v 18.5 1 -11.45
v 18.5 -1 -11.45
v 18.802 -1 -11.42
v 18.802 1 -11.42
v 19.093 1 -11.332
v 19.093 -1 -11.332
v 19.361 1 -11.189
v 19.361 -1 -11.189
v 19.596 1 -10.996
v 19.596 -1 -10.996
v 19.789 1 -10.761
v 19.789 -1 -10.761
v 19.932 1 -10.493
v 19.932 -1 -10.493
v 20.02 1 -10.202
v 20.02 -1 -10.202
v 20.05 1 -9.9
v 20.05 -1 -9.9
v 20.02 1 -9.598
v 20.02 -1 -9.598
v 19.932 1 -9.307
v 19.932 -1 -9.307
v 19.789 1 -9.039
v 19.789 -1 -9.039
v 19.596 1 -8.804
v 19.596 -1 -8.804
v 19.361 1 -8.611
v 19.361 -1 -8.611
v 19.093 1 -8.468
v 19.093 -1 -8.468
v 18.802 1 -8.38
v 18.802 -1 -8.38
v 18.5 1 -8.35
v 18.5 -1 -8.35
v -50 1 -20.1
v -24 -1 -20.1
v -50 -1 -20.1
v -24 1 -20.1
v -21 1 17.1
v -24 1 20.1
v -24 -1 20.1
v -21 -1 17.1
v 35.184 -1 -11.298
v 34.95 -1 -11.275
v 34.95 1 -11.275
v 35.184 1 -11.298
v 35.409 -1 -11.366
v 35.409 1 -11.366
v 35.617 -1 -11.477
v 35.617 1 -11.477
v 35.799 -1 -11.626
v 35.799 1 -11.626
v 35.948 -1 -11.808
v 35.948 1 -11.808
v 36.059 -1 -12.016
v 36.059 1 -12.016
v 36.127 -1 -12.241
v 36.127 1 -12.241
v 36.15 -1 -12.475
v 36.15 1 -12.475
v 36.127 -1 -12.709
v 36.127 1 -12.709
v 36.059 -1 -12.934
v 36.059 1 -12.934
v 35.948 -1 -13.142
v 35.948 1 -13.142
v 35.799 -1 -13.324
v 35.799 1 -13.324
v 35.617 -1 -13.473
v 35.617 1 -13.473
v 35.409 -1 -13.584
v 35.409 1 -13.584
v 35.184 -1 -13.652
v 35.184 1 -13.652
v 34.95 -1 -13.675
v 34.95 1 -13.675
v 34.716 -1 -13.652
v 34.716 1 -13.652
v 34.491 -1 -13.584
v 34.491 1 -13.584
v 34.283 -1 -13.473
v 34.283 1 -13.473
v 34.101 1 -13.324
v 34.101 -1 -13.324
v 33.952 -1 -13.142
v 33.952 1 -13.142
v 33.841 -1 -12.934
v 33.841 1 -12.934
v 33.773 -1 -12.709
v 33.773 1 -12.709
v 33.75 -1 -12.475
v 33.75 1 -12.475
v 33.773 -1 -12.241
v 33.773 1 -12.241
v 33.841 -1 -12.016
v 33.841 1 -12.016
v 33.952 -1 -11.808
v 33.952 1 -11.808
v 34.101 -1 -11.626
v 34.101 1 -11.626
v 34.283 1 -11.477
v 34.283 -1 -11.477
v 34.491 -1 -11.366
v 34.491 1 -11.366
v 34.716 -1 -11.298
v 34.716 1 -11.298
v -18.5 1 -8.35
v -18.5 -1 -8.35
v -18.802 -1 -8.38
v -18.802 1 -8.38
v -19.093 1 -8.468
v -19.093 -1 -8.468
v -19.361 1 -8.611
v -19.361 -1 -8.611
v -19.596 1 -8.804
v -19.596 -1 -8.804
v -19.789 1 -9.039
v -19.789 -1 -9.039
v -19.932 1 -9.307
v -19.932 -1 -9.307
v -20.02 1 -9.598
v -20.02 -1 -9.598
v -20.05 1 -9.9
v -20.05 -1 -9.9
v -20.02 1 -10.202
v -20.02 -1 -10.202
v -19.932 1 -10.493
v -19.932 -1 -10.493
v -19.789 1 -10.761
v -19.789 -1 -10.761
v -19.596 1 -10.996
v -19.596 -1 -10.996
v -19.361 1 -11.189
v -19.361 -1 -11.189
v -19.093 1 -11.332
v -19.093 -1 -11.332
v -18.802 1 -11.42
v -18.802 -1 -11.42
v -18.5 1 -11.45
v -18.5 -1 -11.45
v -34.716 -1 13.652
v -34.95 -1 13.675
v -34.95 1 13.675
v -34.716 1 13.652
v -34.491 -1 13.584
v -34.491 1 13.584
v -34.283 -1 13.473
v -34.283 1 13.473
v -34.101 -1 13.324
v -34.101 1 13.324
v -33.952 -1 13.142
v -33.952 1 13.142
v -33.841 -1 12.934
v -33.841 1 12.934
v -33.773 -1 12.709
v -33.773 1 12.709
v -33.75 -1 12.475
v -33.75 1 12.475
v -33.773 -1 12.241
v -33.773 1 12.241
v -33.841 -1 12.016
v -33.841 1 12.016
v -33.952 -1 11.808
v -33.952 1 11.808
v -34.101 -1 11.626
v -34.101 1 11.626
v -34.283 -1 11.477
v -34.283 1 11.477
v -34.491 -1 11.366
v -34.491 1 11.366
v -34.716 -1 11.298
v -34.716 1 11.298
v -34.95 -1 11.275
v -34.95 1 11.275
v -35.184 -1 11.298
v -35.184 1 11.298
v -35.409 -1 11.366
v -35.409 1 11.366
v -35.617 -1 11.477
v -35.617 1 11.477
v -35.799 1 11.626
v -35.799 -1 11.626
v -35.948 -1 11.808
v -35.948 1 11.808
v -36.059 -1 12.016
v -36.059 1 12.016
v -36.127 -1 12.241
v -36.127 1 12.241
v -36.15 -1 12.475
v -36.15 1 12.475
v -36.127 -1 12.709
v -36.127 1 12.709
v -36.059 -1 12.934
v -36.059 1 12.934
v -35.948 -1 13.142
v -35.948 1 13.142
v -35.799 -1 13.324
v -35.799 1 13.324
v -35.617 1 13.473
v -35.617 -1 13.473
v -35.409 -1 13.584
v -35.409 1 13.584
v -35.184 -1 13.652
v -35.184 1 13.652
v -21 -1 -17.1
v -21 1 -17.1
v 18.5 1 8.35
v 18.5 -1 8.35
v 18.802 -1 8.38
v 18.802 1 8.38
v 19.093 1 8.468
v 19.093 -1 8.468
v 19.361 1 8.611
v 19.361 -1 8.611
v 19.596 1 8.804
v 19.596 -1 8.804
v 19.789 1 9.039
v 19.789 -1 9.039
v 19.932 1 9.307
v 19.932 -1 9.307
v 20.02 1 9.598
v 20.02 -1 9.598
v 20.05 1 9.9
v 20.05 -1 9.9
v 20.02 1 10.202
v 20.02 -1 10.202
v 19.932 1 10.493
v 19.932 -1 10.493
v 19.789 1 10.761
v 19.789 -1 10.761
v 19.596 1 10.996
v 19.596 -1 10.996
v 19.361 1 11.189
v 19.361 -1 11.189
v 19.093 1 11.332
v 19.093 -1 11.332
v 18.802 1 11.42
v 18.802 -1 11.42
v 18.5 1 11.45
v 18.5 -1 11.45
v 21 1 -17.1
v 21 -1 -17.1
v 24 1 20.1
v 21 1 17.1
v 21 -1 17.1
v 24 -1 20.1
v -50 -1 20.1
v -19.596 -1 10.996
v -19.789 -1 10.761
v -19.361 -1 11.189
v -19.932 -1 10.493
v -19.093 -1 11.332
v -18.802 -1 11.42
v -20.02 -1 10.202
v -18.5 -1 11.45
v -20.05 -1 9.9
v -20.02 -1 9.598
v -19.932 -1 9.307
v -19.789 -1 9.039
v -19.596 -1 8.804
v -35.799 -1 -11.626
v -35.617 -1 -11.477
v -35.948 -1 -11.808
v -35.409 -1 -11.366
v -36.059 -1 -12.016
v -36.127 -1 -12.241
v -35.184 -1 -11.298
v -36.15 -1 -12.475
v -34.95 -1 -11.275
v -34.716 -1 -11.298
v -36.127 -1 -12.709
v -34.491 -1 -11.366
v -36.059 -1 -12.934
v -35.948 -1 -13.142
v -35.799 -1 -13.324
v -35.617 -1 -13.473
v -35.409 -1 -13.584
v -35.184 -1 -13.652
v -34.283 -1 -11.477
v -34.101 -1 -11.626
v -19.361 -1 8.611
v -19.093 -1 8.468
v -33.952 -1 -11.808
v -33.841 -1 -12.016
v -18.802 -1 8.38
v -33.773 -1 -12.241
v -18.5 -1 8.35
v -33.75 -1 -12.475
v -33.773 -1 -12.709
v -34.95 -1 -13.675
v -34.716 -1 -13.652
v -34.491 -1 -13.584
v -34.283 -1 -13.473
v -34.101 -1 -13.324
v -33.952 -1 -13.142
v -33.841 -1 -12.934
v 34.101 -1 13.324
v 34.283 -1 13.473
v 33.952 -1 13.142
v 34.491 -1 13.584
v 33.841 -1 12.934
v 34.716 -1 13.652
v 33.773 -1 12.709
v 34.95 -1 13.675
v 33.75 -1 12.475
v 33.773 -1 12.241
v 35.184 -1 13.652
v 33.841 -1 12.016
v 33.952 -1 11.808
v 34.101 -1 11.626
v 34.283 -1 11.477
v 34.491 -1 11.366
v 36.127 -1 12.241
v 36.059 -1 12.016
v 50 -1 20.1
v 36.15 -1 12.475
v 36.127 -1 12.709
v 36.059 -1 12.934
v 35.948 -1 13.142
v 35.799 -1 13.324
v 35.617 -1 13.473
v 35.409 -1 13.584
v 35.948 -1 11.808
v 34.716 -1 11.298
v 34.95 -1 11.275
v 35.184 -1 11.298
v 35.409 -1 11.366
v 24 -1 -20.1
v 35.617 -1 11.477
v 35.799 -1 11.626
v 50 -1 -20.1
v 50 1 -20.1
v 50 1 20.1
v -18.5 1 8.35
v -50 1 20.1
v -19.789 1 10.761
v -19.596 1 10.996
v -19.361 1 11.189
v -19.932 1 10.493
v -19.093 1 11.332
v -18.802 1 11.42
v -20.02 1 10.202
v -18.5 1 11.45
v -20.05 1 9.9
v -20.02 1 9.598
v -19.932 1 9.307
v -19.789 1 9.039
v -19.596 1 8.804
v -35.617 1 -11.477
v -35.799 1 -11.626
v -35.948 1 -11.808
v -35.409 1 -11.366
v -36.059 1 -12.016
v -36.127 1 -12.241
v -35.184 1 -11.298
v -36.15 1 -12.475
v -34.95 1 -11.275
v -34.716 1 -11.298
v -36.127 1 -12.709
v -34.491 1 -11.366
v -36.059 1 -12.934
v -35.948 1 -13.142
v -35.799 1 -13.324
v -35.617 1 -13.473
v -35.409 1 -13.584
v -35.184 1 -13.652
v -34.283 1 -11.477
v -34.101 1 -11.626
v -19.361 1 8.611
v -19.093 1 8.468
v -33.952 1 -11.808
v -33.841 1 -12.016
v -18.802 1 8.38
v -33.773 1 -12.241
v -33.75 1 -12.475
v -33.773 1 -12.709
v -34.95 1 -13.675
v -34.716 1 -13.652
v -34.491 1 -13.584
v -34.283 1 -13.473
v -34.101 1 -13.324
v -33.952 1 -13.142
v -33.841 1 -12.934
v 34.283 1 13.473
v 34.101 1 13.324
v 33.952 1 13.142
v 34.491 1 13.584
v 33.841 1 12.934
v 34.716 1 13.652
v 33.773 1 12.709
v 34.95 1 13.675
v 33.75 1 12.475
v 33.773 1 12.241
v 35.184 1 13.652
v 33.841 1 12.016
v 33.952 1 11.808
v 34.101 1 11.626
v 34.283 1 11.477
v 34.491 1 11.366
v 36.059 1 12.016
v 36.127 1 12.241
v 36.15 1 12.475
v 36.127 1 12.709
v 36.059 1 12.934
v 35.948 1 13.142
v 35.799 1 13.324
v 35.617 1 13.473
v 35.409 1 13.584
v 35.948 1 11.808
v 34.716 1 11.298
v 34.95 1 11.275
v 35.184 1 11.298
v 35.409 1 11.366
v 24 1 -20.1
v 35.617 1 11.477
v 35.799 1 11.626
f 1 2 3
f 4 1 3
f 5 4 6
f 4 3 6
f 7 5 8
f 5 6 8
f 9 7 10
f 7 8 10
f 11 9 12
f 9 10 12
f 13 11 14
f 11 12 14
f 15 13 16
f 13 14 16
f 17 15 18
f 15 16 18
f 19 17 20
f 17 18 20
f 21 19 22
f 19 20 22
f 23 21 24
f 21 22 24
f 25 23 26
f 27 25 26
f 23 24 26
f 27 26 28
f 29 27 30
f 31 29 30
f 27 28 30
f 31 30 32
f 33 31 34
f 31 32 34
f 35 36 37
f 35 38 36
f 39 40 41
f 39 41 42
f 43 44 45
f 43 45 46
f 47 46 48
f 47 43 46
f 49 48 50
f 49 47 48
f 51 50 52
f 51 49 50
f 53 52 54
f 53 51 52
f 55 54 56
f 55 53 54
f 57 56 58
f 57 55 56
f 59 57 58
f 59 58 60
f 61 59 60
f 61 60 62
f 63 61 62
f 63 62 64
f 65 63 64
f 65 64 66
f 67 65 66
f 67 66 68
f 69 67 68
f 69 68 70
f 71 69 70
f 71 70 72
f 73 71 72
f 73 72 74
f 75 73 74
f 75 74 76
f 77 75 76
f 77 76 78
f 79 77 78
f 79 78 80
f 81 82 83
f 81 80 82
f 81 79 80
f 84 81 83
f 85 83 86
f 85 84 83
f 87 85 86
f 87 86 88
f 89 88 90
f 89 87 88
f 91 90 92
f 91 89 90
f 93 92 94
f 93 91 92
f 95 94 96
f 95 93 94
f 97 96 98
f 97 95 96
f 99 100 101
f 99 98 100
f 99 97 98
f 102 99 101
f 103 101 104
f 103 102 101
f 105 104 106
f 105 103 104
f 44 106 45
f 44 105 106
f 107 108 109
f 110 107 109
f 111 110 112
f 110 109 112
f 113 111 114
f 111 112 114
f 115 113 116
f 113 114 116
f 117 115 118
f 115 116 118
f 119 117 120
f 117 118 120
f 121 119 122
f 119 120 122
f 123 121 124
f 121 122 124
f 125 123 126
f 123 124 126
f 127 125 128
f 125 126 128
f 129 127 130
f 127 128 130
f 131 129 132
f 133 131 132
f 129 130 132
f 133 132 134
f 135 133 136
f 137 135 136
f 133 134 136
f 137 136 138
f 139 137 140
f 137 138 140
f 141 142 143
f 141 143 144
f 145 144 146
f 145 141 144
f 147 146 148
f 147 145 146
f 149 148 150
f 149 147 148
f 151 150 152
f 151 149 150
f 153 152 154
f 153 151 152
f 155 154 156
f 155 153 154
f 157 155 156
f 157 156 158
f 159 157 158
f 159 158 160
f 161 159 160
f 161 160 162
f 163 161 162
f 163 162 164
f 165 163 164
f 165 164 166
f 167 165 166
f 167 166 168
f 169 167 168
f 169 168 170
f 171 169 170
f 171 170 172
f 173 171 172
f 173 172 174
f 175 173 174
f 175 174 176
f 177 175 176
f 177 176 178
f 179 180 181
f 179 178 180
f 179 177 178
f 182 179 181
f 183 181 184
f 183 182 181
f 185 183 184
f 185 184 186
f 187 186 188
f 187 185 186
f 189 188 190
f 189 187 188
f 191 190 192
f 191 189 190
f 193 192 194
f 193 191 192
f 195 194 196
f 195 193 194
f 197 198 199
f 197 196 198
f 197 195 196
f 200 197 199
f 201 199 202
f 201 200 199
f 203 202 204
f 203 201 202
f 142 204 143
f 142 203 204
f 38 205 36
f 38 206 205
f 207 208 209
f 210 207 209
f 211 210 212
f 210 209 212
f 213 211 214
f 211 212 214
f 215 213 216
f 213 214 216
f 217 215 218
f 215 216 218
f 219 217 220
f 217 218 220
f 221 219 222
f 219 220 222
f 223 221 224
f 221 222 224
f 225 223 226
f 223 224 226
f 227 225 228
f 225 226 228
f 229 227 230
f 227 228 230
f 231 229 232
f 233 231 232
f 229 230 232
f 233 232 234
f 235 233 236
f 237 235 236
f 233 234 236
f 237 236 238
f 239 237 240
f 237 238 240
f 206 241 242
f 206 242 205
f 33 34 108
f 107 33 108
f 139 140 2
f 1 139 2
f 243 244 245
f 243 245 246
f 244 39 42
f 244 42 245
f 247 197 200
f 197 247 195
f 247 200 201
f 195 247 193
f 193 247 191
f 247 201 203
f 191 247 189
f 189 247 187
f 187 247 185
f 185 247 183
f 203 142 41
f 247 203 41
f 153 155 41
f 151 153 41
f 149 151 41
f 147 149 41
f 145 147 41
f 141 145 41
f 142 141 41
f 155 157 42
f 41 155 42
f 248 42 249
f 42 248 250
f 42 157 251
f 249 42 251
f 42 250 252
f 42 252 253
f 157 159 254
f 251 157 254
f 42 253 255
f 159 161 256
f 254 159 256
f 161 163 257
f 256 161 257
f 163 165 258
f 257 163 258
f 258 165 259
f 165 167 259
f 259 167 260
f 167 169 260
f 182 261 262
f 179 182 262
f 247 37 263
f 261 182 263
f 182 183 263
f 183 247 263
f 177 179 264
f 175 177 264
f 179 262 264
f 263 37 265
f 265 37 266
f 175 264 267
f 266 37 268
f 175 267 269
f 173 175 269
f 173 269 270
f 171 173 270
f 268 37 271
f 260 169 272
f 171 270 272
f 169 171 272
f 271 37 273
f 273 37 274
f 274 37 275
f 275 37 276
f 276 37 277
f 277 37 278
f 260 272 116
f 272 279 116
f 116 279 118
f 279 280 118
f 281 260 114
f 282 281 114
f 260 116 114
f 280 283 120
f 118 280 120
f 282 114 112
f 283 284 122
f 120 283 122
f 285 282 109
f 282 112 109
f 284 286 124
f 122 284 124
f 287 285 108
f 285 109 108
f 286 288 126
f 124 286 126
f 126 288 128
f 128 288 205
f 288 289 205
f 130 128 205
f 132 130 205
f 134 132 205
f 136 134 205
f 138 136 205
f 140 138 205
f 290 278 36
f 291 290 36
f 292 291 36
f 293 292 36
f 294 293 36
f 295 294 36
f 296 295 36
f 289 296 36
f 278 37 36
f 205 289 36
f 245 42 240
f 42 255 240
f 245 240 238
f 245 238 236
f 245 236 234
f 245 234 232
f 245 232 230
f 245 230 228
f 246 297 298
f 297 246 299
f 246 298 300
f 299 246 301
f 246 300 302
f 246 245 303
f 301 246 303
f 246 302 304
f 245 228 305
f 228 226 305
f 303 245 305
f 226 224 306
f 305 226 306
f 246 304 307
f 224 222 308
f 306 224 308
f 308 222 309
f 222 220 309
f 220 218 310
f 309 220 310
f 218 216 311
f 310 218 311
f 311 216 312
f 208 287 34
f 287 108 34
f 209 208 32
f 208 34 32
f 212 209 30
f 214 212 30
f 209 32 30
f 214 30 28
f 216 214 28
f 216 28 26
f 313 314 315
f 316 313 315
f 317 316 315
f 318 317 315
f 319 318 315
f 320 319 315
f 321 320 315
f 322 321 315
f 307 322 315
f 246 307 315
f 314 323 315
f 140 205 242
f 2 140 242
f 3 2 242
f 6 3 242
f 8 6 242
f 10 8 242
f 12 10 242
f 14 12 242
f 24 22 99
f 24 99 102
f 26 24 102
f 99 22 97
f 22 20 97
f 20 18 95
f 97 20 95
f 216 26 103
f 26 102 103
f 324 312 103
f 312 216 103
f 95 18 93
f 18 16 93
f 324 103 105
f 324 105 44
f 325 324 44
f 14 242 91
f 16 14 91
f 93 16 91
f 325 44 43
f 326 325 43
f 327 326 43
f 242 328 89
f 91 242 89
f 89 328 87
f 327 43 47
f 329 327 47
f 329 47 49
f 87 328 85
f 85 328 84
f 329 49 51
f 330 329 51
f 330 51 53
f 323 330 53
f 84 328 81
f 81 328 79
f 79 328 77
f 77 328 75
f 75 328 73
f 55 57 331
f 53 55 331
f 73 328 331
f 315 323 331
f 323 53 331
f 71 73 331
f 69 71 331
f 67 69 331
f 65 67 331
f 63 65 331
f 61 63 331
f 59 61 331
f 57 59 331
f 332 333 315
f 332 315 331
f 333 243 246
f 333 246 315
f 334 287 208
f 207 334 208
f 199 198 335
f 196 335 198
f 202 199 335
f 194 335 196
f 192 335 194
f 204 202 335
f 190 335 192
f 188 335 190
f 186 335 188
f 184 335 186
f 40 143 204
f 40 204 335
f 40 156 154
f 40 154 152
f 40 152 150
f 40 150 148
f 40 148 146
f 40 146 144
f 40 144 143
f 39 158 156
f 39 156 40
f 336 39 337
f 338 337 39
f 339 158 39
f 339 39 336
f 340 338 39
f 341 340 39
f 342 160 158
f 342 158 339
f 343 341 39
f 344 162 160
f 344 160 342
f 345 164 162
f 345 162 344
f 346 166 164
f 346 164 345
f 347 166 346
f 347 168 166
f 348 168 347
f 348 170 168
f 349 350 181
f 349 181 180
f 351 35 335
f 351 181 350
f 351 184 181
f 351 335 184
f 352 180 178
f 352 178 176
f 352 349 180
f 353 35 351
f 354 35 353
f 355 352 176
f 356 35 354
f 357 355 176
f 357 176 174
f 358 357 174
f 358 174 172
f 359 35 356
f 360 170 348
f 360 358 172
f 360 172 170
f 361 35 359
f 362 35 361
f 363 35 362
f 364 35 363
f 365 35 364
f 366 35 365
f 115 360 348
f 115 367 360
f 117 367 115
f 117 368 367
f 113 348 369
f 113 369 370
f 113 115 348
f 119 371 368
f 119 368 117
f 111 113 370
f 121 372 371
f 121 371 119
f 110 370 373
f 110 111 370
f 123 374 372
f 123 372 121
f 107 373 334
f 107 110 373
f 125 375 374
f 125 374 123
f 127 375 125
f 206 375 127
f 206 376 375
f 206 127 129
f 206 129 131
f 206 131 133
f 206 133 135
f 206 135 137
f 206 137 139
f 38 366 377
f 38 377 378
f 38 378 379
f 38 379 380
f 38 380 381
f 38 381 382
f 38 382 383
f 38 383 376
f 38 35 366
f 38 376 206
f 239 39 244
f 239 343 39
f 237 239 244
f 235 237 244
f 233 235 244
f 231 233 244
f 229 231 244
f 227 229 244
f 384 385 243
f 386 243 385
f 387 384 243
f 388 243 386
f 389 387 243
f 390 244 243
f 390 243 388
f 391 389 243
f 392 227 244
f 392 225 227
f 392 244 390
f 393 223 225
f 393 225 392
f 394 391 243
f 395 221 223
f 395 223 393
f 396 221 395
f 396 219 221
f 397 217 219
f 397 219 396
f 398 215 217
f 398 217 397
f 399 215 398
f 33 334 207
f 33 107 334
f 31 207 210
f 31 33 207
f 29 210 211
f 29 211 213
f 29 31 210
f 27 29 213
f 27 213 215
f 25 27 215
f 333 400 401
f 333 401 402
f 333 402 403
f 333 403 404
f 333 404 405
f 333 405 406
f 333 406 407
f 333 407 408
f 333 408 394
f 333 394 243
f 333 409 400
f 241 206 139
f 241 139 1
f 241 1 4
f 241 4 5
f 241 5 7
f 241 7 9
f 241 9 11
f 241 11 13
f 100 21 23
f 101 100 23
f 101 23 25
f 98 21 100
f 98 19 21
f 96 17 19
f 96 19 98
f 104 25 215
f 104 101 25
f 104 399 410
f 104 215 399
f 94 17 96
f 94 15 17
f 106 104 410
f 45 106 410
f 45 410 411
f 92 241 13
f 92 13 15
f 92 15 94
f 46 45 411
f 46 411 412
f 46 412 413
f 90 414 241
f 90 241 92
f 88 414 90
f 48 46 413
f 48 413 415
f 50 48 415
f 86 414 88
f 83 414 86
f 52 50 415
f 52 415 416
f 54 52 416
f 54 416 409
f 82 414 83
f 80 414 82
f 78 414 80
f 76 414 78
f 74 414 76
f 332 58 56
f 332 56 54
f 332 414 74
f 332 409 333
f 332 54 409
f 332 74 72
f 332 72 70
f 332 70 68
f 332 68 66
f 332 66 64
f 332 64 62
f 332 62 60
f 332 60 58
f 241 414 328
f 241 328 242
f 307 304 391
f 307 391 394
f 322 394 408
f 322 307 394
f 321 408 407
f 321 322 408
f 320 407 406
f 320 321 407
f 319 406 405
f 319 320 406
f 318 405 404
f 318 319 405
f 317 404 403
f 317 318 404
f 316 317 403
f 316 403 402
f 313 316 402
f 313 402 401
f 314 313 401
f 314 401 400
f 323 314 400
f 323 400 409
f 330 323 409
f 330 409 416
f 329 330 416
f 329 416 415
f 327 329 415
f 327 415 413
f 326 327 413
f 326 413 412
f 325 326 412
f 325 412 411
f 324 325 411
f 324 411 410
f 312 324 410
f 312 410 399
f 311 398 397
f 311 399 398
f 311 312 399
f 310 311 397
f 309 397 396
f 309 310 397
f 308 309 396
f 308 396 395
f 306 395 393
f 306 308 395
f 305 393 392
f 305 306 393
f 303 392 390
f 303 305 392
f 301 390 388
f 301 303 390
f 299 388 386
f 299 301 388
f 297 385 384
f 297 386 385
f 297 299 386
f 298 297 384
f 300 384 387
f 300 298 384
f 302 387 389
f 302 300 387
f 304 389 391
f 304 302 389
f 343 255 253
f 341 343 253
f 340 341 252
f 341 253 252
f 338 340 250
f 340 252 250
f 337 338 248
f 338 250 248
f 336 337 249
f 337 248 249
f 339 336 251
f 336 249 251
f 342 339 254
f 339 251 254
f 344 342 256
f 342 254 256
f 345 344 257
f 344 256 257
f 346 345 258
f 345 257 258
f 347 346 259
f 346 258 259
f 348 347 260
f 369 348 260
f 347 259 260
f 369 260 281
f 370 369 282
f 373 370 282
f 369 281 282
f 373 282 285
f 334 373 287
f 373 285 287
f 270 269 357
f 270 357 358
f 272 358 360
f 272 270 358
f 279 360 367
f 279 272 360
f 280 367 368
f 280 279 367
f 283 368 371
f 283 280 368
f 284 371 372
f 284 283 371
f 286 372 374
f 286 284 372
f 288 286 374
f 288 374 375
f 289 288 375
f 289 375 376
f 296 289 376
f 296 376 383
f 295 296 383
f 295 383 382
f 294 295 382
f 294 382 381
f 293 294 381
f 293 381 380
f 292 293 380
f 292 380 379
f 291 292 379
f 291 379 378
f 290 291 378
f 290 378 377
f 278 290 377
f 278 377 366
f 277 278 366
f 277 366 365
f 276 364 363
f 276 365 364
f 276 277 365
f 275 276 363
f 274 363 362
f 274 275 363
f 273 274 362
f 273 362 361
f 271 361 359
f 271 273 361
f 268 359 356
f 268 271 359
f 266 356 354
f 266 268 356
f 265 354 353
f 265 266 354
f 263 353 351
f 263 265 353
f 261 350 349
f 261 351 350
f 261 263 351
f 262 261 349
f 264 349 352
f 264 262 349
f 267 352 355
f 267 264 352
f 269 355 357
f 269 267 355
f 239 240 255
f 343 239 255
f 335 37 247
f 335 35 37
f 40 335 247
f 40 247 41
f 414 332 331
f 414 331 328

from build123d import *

# Parameters (mm, degrees)
BOSS_EXTRUDE1_DEPTH     = 1
CUT_EXTRUDE1_DEPTH      = 54.925967771
CUT_EXTRUDE1_DEPTH_BACK = 54.925967771
SKETCH2_R               = 1.2


with BuildPart() as part:
    # Sketch1 → Boss-Extrude1 (new, symmetric)
    with BuildSketch(Plane(origin=(0, 0, 0), x_dir=(1, 0, 0), z_dir=(0, 1, 0))):
        Polygon((-50, 20.1), (-50, -20.1), (-24, -20.1), (-21, -17.1), (21, -17.1), (24, -20.1), (50, -20.1), (50, 20.1), (24, 20.1), (21, 17.1), (-21, 17.1), (-24, 20.1), align=None)
    extrude(amount=BOSS_EXTRUDE1_DEPTH, both=True)

    # Sketch2 → Cut-Extrude1 (cut, two sides: drawn at the far end of the back side and taken through both)
    with BuildSketch(Plane(origin=(0, 1, 0), x_dir=(1, 0, 0), z_dir=(0, 1, 0)).offset(-CUT_EXTRUDE1_DEPTH_BACK)):
        with Locations(Location((-34.95, 12.475, 0), (0, 0, 270))):
            Circle(SKETCH2_R)
        with Locations(Location((-34.95, -12.475, 0), (0, 0, 270))):
            Circle(SKETCH2_R)
        with Locations(Location((34.95, -12.475, 0), (0, 0, 270))):
            Circle(SKETCH2_R)
        with Locations(Location((34.95, 12.475, 0), (0, 0, 270))):
            Circle(SKETCH2_R)
        with BuildLine():
            Line((-18.5, 11.45), (18.5, 11.45))
            ThreePointArc((18.5, 11.45), (20.05, 9.9), (18.5, 8.35))
            Line((18.5, 8.35), (-18.5, 8.35))
            ThreePointArc((-18.5, 8.35), (-20.05, 9.9), (-18.5, 11.45))
        make_face()
        with BuildLine():
            Line((-18.5, -8.35), (18.5, -8.35))
            ThreePointArc((18.5, -8.35), (20.05, -9.9), (18.5, -11.45))
            Line((18.5, -11.45), (-18.5, -11.45))
            ThreePointArc((-18.5, -11.45), (-20.05, -9.9), (-18.5, -8.35))
        make_face()
    extrude(amount=CUT_EXTRUDE1_DEPTH + CUT_EXTRUDE1_DEPTH_BACK, mode=Mode.SUBTRACT)


solid = part.part
